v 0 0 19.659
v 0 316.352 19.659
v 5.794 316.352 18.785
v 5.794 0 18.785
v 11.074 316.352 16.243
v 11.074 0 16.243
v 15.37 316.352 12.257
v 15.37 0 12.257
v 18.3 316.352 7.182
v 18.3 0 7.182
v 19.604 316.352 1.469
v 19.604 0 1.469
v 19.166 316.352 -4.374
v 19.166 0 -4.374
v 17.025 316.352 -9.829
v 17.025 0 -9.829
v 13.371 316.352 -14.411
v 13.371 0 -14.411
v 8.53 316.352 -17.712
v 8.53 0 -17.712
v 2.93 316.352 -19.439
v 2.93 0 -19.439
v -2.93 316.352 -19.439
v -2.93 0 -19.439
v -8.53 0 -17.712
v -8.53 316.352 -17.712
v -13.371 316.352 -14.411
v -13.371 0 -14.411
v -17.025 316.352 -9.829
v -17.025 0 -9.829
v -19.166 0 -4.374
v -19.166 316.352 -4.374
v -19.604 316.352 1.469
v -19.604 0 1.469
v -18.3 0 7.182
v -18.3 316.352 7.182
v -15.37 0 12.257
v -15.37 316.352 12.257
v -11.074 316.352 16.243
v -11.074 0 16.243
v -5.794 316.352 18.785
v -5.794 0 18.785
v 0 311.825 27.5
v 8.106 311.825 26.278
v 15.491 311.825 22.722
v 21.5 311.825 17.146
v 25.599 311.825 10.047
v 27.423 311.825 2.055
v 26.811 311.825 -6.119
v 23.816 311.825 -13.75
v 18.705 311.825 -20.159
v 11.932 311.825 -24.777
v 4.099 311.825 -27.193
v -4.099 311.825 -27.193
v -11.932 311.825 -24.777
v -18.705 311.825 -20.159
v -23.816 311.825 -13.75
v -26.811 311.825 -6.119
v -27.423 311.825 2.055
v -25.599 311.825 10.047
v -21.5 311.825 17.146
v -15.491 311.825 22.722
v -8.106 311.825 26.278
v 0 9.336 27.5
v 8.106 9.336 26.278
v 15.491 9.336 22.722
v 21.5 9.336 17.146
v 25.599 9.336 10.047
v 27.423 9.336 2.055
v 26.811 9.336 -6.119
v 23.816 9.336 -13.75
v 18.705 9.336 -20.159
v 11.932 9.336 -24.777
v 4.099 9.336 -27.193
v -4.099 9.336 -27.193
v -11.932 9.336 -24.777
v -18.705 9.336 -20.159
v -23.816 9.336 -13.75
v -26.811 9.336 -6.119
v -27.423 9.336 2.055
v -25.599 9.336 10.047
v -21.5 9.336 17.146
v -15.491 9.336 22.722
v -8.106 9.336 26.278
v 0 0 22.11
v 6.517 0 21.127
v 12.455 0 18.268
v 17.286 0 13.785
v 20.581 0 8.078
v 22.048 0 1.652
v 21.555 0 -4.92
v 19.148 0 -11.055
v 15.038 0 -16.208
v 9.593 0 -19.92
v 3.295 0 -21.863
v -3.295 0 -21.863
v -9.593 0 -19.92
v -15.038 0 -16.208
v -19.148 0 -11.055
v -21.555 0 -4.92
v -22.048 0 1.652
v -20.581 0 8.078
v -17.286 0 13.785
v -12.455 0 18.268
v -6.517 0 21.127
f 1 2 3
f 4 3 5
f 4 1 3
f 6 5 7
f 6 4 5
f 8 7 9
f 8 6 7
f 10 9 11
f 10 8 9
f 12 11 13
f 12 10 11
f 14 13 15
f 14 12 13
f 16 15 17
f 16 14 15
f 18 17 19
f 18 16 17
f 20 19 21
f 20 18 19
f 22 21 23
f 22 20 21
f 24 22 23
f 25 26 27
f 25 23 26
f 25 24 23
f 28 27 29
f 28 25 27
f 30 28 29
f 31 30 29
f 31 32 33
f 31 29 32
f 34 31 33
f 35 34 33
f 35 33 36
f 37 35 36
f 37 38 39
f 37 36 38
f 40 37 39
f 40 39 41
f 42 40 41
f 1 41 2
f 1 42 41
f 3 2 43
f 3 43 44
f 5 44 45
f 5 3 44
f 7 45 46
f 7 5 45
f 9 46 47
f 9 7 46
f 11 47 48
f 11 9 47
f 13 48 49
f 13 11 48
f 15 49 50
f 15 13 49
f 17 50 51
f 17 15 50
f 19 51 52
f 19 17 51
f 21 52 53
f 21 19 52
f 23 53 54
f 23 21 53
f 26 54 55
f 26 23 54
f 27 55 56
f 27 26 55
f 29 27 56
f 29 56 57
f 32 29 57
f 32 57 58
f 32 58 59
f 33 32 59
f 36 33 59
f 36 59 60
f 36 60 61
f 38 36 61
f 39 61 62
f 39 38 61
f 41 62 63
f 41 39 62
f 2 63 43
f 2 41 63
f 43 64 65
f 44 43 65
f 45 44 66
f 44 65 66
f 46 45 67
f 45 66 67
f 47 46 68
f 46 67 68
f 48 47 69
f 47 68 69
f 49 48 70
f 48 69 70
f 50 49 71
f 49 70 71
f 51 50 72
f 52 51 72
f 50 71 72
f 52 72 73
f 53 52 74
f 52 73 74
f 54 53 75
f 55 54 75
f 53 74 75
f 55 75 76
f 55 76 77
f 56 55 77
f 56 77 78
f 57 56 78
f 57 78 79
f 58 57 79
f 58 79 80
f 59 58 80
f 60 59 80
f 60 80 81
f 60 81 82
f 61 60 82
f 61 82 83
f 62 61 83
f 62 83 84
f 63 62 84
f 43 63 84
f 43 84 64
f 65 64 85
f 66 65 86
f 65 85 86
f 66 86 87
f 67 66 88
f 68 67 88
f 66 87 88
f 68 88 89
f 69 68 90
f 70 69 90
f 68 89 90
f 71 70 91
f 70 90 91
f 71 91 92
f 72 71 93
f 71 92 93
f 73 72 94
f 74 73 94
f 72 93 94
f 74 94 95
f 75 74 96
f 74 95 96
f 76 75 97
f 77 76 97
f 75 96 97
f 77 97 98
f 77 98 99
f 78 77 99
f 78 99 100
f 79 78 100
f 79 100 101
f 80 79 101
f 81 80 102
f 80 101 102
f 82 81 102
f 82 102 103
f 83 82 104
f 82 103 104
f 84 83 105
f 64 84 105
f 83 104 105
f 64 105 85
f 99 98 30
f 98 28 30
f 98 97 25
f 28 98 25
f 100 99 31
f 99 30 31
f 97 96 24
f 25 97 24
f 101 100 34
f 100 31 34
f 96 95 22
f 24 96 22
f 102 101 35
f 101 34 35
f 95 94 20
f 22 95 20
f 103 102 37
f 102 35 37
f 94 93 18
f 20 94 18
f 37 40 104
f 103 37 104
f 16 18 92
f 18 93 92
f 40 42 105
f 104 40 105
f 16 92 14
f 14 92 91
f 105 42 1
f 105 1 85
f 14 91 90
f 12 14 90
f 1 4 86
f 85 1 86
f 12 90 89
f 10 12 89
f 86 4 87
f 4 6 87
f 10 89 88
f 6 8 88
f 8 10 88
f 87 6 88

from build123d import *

# Parameters (mm, degrees)
SKETCH1_R           = 27.5
BOSS_EXTRUDE1_DEPTH = 317.215559
SKETCH2_R           = 19.658611568
CUT_EXTRUDE1_DEPTH  = 320.590692718
CHAMFER1_SIZE       = 5.390289
CHAMFER1_SIZE_2     = 9.336255


with BuildPart() as part:
    # Sketch1 → Boss-Extrude1 (new body)
    with BuildSketch(Plane(origin=(0, 0, 0), x_dir=(1, 0, 0), z_dir=(0, 1, 0))):
        with Locations(Location((0, 0, 0), (0, 0, 270))):
            Circle(SKETCH1_R)
    extrude(amount=BOSS_EXTRUDE1_DEPTH)

    # Sketch2 → Cut-Extrude1 (cut, through all)
    with BuildSketch(Plane(origin=(0, 0, 0), x_dir=(1, 0, 0), z_dir=(0, 1, 0))):
        with Locations(Location((0, 0, 0), (0, 0, 270))):
            Circle(SKETCH2_R)
    extrude(amount=CUT_EXTRUDE1_DEPTH, mode=Mode.SUBTRACT)

    # Chamfer1
    # the kernel refuses this chamfer: 9.336255, 5.390289 mm, written as the material it takes off along each edge
    with BuildSketch(Plane(origin=(0, 317.215559, 0), x_dir=(0, 0, 1), z_dir=(-1, 0, 0))) as chamfer1_piece_1:
        Polygon((27.5, -CHAMFER1_SIZE), (27.5 - CHAMFER1_SIZE_2, 0), (27.5, 0), align=None)
    revolve(axis=Axis((0, 317.215559, 0), (0, 1, 0)), mode=Mode.SUBTRACT)
    with BuildSketch(Plane(origin=(0, 0, 0), x_dir=(0, 0, 1), z_dir=(-1, 0, 0))) as chamfer1_piece_2:
        Polygon((27.5, CHAMFER1_SIZE_2), (27.5 - CHAMFER1_SIZE, 0), (27.5, 0), align=None)
    revolve(axis=Axis((0, 0, 0), (0, 1, 0)), mode=Mode.SUBTRACT)


solid = part.part
